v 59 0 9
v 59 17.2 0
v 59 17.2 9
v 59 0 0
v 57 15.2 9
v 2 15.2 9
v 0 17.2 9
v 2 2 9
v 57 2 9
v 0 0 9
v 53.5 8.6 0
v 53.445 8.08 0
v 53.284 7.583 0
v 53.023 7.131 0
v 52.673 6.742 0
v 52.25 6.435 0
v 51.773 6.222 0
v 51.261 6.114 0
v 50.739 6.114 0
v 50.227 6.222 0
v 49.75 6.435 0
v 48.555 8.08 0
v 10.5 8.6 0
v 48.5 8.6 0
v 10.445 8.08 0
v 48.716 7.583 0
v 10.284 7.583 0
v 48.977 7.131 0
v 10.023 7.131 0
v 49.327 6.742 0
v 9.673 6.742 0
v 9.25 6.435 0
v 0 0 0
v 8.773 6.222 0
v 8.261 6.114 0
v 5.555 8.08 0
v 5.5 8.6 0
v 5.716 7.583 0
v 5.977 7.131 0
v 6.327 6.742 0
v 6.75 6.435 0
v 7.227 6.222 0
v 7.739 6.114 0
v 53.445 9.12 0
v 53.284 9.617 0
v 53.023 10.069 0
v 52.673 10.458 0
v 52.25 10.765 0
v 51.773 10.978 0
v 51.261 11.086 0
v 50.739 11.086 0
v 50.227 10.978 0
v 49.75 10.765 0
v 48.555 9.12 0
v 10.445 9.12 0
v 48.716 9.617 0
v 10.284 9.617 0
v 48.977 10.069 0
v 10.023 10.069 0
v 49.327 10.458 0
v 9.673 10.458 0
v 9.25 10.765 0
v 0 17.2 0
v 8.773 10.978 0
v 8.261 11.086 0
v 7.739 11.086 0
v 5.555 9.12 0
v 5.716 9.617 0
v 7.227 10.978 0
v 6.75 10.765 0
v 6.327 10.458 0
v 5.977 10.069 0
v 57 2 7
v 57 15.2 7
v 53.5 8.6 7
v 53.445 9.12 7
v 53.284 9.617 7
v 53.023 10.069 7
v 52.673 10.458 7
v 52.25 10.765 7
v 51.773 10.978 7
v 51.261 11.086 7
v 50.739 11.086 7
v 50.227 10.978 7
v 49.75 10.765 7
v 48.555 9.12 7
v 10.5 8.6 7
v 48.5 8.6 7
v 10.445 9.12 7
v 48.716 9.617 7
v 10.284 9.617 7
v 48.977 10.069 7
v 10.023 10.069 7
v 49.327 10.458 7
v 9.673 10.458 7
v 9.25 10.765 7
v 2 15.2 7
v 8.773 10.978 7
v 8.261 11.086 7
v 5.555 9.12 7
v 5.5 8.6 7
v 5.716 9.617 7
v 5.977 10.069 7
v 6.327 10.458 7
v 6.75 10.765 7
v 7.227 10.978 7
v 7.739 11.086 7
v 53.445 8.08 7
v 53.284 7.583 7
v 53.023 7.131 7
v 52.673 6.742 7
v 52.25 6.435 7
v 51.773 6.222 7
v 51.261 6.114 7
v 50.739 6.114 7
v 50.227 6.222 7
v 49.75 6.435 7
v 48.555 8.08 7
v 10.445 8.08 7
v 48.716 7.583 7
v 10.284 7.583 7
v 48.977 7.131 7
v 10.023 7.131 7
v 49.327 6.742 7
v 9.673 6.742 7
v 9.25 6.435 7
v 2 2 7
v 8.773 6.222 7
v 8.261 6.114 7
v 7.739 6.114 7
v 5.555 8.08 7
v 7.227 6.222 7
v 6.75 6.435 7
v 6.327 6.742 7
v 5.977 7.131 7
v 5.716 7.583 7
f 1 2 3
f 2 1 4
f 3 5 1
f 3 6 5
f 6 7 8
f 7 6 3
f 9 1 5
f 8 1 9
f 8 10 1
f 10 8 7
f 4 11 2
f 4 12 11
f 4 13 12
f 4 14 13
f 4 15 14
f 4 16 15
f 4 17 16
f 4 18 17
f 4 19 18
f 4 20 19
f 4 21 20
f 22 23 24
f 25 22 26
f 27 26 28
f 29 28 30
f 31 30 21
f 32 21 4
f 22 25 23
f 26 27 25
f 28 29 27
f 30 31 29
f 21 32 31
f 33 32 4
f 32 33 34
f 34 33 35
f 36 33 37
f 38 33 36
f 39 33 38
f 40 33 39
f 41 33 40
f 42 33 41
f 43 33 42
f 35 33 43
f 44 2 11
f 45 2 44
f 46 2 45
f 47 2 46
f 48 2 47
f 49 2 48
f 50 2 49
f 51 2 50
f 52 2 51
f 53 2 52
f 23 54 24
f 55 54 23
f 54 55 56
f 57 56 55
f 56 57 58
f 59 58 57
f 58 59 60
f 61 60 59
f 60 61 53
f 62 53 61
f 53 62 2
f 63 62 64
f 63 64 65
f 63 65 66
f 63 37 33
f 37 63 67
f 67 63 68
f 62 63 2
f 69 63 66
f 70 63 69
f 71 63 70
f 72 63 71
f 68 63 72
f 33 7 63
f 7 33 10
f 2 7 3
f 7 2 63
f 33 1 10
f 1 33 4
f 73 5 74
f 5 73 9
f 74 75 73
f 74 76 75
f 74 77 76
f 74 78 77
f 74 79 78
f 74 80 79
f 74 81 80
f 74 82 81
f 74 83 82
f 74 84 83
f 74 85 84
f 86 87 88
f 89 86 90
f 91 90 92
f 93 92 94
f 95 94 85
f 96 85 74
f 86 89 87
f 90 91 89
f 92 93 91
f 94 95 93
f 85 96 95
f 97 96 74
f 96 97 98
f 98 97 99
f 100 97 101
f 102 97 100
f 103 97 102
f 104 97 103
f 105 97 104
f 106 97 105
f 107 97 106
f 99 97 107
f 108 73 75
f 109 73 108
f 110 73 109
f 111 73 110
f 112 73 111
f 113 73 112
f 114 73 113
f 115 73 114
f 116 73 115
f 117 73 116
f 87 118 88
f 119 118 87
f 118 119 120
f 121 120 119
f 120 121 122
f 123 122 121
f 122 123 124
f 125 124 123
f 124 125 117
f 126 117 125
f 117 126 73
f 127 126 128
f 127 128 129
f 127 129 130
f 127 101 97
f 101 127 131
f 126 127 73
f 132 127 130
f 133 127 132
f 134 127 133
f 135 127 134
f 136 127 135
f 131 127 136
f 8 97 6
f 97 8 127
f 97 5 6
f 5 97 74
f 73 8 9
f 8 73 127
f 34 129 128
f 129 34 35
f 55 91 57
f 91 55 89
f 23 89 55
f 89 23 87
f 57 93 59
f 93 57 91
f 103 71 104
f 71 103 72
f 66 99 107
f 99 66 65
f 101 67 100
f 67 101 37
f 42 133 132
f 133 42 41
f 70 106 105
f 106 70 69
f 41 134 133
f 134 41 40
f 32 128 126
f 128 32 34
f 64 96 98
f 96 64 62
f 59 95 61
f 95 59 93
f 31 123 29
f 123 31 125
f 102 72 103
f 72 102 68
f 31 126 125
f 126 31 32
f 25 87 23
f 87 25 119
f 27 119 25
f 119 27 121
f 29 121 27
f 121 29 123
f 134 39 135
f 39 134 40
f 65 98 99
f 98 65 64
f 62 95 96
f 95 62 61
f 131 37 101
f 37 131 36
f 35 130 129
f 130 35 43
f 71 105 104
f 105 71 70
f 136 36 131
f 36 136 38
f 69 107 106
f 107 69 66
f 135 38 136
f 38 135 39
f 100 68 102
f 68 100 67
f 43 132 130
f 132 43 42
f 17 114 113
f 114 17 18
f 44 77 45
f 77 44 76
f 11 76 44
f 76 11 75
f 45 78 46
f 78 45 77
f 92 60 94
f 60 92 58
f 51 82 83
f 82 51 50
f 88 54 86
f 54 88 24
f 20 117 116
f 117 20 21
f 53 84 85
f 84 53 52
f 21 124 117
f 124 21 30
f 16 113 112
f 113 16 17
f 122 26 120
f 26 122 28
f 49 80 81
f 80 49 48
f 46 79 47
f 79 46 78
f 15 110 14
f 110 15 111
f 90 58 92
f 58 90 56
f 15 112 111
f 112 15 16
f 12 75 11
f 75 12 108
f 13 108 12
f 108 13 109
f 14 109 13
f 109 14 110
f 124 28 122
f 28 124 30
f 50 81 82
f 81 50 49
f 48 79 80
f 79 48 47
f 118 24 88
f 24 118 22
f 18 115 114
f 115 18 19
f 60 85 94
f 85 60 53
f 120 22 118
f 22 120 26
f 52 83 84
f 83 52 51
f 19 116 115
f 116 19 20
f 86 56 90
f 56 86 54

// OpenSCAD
inner_width = 55;
inner_depth = 13.2;
wall = 2;
height = 7;

$fn = 30;

difference() {
    cube([inner_width + 2 * wall, inner_depth + 2 * wall, height + wall]);
    translate([wall, wall, height]) cube([inner_width, inner_depth, wall]);
    translate([wall + 6, wall + inner_depth/2, 0]) cylinder(d = 5, h = height);
    translate([wall + inner_width - 6, wall + inner_depth/2, 0]) cylinder(d = 5, h = height);
}
